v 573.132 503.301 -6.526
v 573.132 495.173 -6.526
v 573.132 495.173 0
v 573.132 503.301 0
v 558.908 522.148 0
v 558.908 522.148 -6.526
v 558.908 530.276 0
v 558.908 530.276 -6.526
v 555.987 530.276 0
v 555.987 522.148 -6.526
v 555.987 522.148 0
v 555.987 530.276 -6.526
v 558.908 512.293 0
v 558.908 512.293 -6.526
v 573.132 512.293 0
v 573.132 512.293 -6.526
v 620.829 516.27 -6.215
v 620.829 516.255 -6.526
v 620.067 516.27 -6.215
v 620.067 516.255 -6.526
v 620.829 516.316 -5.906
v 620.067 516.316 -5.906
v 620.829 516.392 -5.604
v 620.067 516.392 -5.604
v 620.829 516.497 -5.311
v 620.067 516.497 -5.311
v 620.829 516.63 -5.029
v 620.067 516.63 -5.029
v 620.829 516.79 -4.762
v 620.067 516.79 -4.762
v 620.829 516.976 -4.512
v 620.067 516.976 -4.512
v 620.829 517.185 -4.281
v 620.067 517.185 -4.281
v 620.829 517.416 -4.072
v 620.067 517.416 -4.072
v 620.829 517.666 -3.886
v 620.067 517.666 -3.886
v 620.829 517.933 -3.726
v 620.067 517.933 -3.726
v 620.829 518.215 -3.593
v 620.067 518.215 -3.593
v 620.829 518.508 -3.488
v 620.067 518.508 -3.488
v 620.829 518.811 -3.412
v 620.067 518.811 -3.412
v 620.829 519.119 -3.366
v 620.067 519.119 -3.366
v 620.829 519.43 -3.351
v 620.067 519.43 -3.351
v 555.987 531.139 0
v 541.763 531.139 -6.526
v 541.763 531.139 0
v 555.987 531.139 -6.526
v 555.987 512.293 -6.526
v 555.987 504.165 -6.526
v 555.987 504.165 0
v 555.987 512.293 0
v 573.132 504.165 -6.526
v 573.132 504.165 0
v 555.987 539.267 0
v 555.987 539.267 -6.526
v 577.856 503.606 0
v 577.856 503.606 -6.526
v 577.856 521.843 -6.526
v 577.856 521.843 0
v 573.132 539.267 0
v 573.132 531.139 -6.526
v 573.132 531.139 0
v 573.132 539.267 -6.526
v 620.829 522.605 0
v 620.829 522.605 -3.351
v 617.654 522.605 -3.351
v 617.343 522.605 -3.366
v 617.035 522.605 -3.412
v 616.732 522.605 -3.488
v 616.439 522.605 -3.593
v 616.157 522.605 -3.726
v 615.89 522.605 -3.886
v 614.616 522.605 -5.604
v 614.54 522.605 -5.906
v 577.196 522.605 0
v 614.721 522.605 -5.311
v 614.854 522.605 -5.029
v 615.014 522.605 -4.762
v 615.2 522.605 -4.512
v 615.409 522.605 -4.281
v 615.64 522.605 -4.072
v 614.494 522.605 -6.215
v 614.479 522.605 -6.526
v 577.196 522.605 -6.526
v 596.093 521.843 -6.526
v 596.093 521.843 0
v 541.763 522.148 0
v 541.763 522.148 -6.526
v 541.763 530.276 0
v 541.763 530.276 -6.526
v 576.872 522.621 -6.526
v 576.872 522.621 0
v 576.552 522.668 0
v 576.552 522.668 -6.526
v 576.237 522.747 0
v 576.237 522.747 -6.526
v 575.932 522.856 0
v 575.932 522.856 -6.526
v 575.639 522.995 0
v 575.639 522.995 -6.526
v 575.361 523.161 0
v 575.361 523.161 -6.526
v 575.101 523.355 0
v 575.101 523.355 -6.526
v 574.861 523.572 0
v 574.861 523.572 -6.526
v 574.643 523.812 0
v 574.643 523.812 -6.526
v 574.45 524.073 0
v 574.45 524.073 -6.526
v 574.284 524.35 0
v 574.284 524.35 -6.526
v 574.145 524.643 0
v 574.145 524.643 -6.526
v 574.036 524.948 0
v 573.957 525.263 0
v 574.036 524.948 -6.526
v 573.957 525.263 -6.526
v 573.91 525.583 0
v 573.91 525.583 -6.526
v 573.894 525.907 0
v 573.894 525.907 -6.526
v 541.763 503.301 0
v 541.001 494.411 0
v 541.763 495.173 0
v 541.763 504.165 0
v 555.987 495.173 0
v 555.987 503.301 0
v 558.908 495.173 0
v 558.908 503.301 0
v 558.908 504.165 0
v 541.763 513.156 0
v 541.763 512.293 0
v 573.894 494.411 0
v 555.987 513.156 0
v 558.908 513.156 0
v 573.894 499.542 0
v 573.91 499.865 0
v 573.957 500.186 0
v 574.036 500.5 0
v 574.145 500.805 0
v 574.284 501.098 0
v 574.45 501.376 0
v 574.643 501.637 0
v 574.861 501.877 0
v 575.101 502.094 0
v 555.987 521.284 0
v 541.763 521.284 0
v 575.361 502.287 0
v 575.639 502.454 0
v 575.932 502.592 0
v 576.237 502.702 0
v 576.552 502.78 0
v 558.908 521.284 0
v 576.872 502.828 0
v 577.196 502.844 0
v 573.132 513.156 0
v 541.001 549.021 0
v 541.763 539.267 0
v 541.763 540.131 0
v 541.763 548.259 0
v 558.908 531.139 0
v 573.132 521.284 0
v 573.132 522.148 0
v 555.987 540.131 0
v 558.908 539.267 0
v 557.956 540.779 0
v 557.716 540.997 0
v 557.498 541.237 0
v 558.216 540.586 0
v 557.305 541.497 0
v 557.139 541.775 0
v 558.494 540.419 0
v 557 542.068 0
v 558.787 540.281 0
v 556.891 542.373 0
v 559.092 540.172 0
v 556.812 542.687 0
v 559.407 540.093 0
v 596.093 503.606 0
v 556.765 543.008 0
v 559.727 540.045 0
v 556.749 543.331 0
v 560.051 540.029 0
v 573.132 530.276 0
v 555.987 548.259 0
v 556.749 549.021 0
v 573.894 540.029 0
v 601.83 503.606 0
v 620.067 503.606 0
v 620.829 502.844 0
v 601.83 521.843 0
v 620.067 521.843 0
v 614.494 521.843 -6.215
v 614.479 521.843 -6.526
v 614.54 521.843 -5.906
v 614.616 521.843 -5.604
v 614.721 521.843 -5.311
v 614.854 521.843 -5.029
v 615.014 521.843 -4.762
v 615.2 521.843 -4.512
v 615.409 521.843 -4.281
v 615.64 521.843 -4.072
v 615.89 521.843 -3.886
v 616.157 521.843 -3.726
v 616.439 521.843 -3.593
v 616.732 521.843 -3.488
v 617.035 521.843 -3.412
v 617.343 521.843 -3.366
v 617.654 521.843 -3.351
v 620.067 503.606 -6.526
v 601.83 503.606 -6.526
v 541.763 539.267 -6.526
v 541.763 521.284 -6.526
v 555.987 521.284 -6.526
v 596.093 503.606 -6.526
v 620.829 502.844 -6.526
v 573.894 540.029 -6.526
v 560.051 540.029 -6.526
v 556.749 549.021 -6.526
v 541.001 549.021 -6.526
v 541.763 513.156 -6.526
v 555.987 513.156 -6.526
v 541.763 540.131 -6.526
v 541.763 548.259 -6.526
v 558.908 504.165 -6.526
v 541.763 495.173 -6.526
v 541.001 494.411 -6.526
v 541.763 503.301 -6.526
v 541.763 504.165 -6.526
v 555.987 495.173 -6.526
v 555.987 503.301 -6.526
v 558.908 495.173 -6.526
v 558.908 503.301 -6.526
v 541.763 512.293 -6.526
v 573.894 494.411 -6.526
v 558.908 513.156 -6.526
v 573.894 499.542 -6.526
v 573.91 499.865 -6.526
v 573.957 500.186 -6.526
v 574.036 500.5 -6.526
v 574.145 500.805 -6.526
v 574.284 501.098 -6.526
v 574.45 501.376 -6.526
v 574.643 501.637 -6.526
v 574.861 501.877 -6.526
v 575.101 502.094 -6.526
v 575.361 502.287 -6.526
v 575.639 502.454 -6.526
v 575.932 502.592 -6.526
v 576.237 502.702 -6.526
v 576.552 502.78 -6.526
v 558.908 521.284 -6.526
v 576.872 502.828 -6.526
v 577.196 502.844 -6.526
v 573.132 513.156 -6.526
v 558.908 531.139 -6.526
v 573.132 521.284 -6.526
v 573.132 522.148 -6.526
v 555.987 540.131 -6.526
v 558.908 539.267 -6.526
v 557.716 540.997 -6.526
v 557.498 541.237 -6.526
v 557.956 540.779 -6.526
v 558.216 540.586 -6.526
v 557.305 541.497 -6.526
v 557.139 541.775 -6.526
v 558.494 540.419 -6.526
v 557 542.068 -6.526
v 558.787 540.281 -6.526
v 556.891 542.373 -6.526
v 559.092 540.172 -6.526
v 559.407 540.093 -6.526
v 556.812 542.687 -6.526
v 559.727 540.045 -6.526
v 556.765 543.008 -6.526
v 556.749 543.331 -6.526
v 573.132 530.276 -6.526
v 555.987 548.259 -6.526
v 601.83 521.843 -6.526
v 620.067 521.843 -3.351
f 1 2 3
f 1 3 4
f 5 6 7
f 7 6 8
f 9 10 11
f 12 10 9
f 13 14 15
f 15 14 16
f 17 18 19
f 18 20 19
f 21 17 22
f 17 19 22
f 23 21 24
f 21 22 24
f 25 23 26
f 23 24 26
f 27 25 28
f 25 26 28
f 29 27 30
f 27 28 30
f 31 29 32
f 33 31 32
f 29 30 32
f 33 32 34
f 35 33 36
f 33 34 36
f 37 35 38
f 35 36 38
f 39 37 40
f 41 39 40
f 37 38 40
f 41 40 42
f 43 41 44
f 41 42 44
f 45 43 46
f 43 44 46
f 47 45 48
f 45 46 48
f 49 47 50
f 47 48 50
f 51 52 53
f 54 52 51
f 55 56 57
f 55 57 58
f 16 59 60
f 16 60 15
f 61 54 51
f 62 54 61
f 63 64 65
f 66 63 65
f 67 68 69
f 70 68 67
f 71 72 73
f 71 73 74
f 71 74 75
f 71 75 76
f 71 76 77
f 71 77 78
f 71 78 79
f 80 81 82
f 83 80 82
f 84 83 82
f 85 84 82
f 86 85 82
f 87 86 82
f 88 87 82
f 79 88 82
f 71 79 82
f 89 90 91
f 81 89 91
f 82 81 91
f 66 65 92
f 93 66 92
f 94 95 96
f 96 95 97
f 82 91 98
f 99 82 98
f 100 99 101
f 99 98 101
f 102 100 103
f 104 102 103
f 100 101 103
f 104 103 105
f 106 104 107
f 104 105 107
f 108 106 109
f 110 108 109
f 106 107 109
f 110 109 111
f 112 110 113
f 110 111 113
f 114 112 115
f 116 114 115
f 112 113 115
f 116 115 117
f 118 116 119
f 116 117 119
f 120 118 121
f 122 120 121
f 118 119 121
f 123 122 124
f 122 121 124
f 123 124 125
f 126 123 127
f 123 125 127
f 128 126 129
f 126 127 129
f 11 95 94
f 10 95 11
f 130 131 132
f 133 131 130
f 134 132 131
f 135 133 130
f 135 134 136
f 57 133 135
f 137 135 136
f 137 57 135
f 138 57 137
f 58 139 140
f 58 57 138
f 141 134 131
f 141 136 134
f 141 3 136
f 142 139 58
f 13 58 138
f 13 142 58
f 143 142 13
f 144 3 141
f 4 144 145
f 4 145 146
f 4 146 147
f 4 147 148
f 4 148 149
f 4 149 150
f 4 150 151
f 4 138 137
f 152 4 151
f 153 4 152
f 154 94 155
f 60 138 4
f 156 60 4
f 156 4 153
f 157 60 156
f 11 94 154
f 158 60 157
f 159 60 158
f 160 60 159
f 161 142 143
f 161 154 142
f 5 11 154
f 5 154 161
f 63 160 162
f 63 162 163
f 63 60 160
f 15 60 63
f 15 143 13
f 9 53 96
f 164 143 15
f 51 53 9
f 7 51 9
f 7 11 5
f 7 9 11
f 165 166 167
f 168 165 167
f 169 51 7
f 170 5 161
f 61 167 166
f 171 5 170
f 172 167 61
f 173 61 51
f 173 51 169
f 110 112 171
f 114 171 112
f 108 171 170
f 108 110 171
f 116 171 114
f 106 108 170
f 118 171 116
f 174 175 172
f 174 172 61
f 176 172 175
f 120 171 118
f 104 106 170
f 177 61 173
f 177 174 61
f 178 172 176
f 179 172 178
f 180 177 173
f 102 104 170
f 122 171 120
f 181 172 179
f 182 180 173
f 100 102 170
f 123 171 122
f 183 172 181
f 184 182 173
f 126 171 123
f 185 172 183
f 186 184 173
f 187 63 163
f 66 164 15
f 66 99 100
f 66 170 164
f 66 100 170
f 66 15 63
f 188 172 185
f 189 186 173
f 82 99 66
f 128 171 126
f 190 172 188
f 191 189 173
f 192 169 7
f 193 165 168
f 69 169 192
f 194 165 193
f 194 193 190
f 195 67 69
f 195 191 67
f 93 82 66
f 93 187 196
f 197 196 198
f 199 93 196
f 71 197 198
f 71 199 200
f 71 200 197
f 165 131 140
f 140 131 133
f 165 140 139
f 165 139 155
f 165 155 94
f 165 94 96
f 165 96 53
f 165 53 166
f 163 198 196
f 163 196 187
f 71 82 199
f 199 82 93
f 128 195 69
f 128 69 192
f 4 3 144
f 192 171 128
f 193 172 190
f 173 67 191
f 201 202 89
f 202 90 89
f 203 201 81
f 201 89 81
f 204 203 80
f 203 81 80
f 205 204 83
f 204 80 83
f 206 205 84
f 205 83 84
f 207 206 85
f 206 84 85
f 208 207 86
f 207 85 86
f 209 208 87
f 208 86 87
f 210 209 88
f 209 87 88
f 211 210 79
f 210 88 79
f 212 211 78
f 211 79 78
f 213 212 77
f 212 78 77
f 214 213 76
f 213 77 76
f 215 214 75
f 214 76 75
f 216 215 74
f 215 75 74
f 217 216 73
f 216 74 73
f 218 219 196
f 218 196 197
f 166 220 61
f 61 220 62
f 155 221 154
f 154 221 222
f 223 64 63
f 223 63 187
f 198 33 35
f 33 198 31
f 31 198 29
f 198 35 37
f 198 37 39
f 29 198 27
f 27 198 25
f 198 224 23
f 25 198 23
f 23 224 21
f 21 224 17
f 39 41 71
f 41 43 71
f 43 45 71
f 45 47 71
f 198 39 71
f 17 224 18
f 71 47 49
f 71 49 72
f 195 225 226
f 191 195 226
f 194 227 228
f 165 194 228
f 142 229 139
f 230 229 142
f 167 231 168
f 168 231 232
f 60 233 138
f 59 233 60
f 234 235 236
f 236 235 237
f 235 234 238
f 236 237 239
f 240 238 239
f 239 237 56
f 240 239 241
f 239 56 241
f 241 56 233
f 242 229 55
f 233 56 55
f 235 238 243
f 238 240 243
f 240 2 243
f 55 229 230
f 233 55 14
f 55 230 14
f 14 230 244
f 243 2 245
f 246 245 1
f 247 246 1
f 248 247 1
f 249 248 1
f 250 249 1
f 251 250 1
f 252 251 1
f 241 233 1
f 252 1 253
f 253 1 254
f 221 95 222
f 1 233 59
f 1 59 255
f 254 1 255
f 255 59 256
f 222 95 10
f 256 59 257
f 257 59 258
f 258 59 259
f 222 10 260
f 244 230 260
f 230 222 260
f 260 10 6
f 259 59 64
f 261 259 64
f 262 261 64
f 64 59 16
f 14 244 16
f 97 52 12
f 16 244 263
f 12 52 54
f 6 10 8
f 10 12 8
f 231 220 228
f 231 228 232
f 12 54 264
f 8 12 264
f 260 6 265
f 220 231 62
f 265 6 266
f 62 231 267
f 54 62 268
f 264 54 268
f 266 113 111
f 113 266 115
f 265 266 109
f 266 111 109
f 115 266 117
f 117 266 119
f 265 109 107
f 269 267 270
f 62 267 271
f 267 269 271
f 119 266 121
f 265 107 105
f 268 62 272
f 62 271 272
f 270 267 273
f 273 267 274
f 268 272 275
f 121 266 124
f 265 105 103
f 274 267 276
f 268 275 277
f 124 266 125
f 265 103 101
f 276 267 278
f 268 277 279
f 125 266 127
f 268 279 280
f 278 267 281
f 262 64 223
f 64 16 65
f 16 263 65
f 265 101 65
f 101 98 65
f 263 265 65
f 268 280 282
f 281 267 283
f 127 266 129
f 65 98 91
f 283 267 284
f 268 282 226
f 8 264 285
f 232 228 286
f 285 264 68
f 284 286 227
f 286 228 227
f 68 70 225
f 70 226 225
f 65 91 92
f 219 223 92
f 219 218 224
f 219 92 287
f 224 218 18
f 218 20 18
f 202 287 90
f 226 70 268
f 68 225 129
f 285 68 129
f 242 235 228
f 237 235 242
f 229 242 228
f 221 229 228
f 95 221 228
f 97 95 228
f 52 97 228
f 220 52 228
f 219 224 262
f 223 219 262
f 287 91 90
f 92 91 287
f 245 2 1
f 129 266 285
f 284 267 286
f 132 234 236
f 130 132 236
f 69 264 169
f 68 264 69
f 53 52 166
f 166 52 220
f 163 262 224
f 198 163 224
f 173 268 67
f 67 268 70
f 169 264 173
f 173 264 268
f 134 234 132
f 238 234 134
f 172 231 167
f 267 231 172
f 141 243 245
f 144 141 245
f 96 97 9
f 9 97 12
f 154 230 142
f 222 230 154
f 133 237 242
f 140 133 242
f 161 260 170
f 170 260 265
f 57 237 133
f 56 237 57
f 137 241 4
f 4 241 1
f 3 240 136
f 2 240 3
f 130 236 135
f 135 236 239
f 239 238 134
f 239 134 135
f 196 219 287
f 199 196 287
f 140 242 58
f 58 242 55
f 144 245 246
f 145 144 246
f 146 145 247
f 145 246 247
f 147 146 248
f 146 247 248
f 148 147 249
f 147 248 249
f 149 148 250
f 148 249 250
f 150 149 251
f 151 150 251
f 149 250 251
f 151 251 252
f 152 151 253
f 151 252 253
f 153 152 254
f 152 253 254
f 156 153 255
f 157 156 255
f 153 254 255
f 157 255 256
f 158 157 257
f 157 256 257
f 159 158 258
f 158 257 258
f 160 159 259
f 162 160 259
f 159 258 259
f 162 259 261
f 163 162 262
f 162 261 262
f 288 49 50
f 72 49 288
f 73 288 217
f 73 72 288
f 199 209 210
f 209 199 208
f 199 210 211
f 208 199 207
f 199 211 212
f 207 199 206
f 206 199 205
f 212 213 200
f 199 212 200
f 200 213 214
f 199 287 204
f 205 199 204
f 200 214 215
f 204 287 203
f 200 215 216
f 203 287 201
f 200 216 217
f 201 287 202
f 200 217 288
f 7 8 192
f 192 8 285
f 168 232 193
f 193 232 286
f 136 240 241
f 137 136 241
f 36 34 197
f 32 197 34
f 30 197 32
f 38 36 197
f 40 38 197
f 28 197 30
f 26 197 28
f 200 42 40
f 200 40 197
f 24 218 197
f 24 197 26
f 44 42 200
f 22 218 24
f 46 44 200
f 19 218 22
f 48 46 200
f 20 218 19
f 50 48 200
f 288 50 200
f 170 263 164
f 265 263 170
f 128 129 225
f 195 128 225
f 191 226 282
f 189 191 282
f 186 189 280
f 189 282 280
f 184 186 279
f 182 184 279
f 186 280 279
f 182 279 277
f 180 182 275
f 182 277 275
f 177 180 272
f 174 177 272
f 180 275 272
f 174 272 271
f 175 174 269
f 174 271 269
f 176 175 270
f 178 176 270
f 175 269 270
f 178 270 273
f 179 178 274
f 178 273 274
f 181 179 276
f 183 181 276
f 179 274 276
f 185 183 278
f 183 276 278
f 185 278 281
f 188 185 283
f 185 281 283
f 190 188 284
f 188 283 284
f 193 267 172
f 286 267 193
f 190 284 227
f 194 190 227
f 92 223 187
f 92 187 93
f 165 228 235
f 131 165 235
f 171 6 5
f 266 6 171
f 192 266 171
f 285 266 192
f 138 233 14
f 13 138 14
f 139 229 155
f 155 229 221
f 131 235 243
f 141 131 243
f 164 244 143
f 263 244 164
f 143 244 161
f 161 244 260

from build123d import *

# Parameters (mm, degrees)
PART2_EYEBROW_START                          = -6.52585
PART2_EYEBROW_WARNING_MODULE_MIRRORED_OU_W   = 14.224
PART2_EYEBROW_WARNING_MODULE_MIRRORED_OU_H   = 8.128
PART2_EYEBROW_WARNING_MODULE_MIRRORED_OU_W_2 = 18.2372
PART2_EYEBROW_WARNING_MODULE_MIRRORED_OU_H_2 = 18.2372
PART2_EYEBROW_WARNING_MODULE_MIRRORED_DEPTH  = 6.52585
SKETCH2_W                                    = 6.35
SKETCH2_H                                    = 6.35
CUT_EXTRUDE1_DEPTH                           = 3.175
FILLET1_R                                    = 3.175


# Read off the part's stored shape, not the designer's step: Part2^Eyebrow Warning Module_Mirrored
with BuildPart() as part:
    # Part2^Eyebrow Warning Module_Mirrored ou → Part2^Eyebrow Warning Module_Mirrored (new body)
    with BuildSketch(Plane.XY.offset(PART2_EYEBROW_START)):
        with BuildLine():
            Line((573.893747576, 540.0294), (560.050747576, 540.0294))
            ThreePointArc((560.050747576, 540.0294), (557.715880985, 540.996533409), (556.748747576, 543.3314))
            Line((556.748747576, 543.3314), (556.748747576, 549.021))
            Line((556.748747576, 549.021), (541.000747576, 549.021))
            Line((541.000747576, 549.021), (541.000747576, 494.411))
            Line((541.000747576, 494.411), (573.893747576, 494.411))
            Line((573.893747576, 494.411), (573.893747576, 499.5418))
            ThreePointArc((573.893747576, 499.5418), (574.860880985, 501.876666591), (577.195747576, 502.8438))
            Line((577.195747576, 502.8438), (620.829097092, 502.8438))
            Line((620.829097092, 502.8438), (620.829097092, 522.605))
            Line((620.829097092, 522.605), (577.195747576, 522.605))
            ThreePointArc((577.195747576, 522.605), (574.860880985, 523.572133409), (573.893747576, 525.907))
            Line((573.893747576, 525.907), (573.893747576, 540.0294))
        make_face()
        with Locations((548.874747576, 499.237)):
            Rectangle(PART2_EYEBROW_WARNING_MODULE_MIRRORED_OU_W, PART2_EYEBROW_WARNING_MODULE_MIRRORED_OU_H, mode=Mode.SUBTRACT)
        with Locations((566.019747576, 499.237)):
            Rectangle(PART2_EYEBROW_WARNING_MODULE_MIRRORED_OU_W, PART2_EYEBROW_WARNING_MODULE_MIRRORED_OU_H, mode=Mode.SUBTRACT)
        with Locations((548.874747576, 508.2286)):
            Rectangle(PART2_EYEBROW_WARNING_MODULE_MIRRORED_OU_W, PART2_EYEBROW_WARNING_MODULE_MIRRORED_OU_H, mode=Mode.SUBTRACT)
        with Locations((548.874747576, 517.2202)):
            Rectangle(PART2_EYEBROW_WARNING_MODULE_MIRRORED_OU_W, PART2_EYEBROW_WARNING_MODULE_MIRRORED_OU_H, mode=Mode.SUBTRACT)
        with Locations((566.019747576, 508.2286)):
            Rectangle(PART2_EYEBROW_WARNING_MODULE_MIRRORED_OU_W, PART2_EYEBROW_WARNING_MODULE_MIRRORED_OU_H, mode=Mode.SUBTRACT)
        with Locations((566.019747576, 517.2202)):
            Rectangle(PART2_EYEBROW_WARNING_MODULE_MIRRORED_OU_W, PART2_EYEBROW_WARNING_MODULE_MIRRORED_OU_H, mode=Mode.SUBTRACT)
        with Locations((586.974747576, 512.7244)):
            Rectangle(PART2_EYEBROW_WARNING_MODULE_MIRRORED_OU_W_2, PART2_EYEBROW_WARNING_MODULE_MIRRORED_OU_H_2, mode=Mode.SUBTRACT)
        with Locations((610.948497092, 512.7244)):
            Rectangle(PART2_EYEBROW_WARNING_MODULE_MIRRORED_OU_W_2, PART2_EYEBROW_WARNING_MODULE_MIRRORED_OU_H_2, mode=Mode.SUBTRACT)
        with Locations((548.874747576, 526.2118)):
            Rectangle(PART2_EYEBROW_WARNING_MODULE_MIRRORED_OU_W, PART2_EYEBROW_WARNING_MODULE_MIRRORED_OU_H, mode=Mode.SUBTRACT)
        with Locations((548.874747576, 535.2034)):
            Rectangle(PART2_EYEBROW_WARNING_MODULE_MIRRORED_OU_W, PART2_EYEBROW_WARNING_MODULE_MIRRORED_OU_H, mode=Mode.SUBTRACT)
        with Locations((566.019747576, 526.2118)):
            Rectangle(PART2_EYEBROW_WARNING_MODULE_MIRRORED_OU_W, PART2_EYEBROW_WARNING_MODULE_MIRRORED_OU_H, mode=Mode.SUBTRACT)
        with Locations((566.019747576, 535.2034)):
            Rectangle(PART2_EYEBROW_WARNING_MODULE_MIRRORED_OU_W, PART2_EYEBROW_WARNING_MODULE_MIRRORED_OU_H, mode=Mode.SUBTRACT)
        with Locations((548.874747576, 544.195)):
            Rectangle(PART2_EYEBROW_WARNING_MODULE_MIRRORED_OU_W, PART2_EYEBROW_WARNING_MODULE_MIRRORED_OU_H, mode=Mode.SUBTRACT)
    extrude(amount=PART2_EYEBROW_WARNING_MODULE_MIRRORED_DEPTH)

    # Sketch2 → Cut-Extrude1 (cut)
    with BuildSketch(Plane(origin=(0, 0, -6.52585), x_dir=(-1, 0, 0), z_dir=(0, 0, -1))):
        with Locations((-617.654097092, 519.43)):
            Rectangle(SKETCH2_W, SKETCH2_H)
    extrude(amount=-CUT_EXTRUDE1_DEPTH, mode=Mode.SUBTRACT)

    # Fillet1
    fillet1_edges = [part.edges().sort_by_distance(p)[0] for p in [
        (614.479097092, 522.224, -3.35085),
        (620.448097092, 516.255, -3.35085),
    ]]
    fillet(fillet1_edges, radius=FILLET1_R - 0.0001)  # a hair under: the kernel refuses the full size


solid = part.part
